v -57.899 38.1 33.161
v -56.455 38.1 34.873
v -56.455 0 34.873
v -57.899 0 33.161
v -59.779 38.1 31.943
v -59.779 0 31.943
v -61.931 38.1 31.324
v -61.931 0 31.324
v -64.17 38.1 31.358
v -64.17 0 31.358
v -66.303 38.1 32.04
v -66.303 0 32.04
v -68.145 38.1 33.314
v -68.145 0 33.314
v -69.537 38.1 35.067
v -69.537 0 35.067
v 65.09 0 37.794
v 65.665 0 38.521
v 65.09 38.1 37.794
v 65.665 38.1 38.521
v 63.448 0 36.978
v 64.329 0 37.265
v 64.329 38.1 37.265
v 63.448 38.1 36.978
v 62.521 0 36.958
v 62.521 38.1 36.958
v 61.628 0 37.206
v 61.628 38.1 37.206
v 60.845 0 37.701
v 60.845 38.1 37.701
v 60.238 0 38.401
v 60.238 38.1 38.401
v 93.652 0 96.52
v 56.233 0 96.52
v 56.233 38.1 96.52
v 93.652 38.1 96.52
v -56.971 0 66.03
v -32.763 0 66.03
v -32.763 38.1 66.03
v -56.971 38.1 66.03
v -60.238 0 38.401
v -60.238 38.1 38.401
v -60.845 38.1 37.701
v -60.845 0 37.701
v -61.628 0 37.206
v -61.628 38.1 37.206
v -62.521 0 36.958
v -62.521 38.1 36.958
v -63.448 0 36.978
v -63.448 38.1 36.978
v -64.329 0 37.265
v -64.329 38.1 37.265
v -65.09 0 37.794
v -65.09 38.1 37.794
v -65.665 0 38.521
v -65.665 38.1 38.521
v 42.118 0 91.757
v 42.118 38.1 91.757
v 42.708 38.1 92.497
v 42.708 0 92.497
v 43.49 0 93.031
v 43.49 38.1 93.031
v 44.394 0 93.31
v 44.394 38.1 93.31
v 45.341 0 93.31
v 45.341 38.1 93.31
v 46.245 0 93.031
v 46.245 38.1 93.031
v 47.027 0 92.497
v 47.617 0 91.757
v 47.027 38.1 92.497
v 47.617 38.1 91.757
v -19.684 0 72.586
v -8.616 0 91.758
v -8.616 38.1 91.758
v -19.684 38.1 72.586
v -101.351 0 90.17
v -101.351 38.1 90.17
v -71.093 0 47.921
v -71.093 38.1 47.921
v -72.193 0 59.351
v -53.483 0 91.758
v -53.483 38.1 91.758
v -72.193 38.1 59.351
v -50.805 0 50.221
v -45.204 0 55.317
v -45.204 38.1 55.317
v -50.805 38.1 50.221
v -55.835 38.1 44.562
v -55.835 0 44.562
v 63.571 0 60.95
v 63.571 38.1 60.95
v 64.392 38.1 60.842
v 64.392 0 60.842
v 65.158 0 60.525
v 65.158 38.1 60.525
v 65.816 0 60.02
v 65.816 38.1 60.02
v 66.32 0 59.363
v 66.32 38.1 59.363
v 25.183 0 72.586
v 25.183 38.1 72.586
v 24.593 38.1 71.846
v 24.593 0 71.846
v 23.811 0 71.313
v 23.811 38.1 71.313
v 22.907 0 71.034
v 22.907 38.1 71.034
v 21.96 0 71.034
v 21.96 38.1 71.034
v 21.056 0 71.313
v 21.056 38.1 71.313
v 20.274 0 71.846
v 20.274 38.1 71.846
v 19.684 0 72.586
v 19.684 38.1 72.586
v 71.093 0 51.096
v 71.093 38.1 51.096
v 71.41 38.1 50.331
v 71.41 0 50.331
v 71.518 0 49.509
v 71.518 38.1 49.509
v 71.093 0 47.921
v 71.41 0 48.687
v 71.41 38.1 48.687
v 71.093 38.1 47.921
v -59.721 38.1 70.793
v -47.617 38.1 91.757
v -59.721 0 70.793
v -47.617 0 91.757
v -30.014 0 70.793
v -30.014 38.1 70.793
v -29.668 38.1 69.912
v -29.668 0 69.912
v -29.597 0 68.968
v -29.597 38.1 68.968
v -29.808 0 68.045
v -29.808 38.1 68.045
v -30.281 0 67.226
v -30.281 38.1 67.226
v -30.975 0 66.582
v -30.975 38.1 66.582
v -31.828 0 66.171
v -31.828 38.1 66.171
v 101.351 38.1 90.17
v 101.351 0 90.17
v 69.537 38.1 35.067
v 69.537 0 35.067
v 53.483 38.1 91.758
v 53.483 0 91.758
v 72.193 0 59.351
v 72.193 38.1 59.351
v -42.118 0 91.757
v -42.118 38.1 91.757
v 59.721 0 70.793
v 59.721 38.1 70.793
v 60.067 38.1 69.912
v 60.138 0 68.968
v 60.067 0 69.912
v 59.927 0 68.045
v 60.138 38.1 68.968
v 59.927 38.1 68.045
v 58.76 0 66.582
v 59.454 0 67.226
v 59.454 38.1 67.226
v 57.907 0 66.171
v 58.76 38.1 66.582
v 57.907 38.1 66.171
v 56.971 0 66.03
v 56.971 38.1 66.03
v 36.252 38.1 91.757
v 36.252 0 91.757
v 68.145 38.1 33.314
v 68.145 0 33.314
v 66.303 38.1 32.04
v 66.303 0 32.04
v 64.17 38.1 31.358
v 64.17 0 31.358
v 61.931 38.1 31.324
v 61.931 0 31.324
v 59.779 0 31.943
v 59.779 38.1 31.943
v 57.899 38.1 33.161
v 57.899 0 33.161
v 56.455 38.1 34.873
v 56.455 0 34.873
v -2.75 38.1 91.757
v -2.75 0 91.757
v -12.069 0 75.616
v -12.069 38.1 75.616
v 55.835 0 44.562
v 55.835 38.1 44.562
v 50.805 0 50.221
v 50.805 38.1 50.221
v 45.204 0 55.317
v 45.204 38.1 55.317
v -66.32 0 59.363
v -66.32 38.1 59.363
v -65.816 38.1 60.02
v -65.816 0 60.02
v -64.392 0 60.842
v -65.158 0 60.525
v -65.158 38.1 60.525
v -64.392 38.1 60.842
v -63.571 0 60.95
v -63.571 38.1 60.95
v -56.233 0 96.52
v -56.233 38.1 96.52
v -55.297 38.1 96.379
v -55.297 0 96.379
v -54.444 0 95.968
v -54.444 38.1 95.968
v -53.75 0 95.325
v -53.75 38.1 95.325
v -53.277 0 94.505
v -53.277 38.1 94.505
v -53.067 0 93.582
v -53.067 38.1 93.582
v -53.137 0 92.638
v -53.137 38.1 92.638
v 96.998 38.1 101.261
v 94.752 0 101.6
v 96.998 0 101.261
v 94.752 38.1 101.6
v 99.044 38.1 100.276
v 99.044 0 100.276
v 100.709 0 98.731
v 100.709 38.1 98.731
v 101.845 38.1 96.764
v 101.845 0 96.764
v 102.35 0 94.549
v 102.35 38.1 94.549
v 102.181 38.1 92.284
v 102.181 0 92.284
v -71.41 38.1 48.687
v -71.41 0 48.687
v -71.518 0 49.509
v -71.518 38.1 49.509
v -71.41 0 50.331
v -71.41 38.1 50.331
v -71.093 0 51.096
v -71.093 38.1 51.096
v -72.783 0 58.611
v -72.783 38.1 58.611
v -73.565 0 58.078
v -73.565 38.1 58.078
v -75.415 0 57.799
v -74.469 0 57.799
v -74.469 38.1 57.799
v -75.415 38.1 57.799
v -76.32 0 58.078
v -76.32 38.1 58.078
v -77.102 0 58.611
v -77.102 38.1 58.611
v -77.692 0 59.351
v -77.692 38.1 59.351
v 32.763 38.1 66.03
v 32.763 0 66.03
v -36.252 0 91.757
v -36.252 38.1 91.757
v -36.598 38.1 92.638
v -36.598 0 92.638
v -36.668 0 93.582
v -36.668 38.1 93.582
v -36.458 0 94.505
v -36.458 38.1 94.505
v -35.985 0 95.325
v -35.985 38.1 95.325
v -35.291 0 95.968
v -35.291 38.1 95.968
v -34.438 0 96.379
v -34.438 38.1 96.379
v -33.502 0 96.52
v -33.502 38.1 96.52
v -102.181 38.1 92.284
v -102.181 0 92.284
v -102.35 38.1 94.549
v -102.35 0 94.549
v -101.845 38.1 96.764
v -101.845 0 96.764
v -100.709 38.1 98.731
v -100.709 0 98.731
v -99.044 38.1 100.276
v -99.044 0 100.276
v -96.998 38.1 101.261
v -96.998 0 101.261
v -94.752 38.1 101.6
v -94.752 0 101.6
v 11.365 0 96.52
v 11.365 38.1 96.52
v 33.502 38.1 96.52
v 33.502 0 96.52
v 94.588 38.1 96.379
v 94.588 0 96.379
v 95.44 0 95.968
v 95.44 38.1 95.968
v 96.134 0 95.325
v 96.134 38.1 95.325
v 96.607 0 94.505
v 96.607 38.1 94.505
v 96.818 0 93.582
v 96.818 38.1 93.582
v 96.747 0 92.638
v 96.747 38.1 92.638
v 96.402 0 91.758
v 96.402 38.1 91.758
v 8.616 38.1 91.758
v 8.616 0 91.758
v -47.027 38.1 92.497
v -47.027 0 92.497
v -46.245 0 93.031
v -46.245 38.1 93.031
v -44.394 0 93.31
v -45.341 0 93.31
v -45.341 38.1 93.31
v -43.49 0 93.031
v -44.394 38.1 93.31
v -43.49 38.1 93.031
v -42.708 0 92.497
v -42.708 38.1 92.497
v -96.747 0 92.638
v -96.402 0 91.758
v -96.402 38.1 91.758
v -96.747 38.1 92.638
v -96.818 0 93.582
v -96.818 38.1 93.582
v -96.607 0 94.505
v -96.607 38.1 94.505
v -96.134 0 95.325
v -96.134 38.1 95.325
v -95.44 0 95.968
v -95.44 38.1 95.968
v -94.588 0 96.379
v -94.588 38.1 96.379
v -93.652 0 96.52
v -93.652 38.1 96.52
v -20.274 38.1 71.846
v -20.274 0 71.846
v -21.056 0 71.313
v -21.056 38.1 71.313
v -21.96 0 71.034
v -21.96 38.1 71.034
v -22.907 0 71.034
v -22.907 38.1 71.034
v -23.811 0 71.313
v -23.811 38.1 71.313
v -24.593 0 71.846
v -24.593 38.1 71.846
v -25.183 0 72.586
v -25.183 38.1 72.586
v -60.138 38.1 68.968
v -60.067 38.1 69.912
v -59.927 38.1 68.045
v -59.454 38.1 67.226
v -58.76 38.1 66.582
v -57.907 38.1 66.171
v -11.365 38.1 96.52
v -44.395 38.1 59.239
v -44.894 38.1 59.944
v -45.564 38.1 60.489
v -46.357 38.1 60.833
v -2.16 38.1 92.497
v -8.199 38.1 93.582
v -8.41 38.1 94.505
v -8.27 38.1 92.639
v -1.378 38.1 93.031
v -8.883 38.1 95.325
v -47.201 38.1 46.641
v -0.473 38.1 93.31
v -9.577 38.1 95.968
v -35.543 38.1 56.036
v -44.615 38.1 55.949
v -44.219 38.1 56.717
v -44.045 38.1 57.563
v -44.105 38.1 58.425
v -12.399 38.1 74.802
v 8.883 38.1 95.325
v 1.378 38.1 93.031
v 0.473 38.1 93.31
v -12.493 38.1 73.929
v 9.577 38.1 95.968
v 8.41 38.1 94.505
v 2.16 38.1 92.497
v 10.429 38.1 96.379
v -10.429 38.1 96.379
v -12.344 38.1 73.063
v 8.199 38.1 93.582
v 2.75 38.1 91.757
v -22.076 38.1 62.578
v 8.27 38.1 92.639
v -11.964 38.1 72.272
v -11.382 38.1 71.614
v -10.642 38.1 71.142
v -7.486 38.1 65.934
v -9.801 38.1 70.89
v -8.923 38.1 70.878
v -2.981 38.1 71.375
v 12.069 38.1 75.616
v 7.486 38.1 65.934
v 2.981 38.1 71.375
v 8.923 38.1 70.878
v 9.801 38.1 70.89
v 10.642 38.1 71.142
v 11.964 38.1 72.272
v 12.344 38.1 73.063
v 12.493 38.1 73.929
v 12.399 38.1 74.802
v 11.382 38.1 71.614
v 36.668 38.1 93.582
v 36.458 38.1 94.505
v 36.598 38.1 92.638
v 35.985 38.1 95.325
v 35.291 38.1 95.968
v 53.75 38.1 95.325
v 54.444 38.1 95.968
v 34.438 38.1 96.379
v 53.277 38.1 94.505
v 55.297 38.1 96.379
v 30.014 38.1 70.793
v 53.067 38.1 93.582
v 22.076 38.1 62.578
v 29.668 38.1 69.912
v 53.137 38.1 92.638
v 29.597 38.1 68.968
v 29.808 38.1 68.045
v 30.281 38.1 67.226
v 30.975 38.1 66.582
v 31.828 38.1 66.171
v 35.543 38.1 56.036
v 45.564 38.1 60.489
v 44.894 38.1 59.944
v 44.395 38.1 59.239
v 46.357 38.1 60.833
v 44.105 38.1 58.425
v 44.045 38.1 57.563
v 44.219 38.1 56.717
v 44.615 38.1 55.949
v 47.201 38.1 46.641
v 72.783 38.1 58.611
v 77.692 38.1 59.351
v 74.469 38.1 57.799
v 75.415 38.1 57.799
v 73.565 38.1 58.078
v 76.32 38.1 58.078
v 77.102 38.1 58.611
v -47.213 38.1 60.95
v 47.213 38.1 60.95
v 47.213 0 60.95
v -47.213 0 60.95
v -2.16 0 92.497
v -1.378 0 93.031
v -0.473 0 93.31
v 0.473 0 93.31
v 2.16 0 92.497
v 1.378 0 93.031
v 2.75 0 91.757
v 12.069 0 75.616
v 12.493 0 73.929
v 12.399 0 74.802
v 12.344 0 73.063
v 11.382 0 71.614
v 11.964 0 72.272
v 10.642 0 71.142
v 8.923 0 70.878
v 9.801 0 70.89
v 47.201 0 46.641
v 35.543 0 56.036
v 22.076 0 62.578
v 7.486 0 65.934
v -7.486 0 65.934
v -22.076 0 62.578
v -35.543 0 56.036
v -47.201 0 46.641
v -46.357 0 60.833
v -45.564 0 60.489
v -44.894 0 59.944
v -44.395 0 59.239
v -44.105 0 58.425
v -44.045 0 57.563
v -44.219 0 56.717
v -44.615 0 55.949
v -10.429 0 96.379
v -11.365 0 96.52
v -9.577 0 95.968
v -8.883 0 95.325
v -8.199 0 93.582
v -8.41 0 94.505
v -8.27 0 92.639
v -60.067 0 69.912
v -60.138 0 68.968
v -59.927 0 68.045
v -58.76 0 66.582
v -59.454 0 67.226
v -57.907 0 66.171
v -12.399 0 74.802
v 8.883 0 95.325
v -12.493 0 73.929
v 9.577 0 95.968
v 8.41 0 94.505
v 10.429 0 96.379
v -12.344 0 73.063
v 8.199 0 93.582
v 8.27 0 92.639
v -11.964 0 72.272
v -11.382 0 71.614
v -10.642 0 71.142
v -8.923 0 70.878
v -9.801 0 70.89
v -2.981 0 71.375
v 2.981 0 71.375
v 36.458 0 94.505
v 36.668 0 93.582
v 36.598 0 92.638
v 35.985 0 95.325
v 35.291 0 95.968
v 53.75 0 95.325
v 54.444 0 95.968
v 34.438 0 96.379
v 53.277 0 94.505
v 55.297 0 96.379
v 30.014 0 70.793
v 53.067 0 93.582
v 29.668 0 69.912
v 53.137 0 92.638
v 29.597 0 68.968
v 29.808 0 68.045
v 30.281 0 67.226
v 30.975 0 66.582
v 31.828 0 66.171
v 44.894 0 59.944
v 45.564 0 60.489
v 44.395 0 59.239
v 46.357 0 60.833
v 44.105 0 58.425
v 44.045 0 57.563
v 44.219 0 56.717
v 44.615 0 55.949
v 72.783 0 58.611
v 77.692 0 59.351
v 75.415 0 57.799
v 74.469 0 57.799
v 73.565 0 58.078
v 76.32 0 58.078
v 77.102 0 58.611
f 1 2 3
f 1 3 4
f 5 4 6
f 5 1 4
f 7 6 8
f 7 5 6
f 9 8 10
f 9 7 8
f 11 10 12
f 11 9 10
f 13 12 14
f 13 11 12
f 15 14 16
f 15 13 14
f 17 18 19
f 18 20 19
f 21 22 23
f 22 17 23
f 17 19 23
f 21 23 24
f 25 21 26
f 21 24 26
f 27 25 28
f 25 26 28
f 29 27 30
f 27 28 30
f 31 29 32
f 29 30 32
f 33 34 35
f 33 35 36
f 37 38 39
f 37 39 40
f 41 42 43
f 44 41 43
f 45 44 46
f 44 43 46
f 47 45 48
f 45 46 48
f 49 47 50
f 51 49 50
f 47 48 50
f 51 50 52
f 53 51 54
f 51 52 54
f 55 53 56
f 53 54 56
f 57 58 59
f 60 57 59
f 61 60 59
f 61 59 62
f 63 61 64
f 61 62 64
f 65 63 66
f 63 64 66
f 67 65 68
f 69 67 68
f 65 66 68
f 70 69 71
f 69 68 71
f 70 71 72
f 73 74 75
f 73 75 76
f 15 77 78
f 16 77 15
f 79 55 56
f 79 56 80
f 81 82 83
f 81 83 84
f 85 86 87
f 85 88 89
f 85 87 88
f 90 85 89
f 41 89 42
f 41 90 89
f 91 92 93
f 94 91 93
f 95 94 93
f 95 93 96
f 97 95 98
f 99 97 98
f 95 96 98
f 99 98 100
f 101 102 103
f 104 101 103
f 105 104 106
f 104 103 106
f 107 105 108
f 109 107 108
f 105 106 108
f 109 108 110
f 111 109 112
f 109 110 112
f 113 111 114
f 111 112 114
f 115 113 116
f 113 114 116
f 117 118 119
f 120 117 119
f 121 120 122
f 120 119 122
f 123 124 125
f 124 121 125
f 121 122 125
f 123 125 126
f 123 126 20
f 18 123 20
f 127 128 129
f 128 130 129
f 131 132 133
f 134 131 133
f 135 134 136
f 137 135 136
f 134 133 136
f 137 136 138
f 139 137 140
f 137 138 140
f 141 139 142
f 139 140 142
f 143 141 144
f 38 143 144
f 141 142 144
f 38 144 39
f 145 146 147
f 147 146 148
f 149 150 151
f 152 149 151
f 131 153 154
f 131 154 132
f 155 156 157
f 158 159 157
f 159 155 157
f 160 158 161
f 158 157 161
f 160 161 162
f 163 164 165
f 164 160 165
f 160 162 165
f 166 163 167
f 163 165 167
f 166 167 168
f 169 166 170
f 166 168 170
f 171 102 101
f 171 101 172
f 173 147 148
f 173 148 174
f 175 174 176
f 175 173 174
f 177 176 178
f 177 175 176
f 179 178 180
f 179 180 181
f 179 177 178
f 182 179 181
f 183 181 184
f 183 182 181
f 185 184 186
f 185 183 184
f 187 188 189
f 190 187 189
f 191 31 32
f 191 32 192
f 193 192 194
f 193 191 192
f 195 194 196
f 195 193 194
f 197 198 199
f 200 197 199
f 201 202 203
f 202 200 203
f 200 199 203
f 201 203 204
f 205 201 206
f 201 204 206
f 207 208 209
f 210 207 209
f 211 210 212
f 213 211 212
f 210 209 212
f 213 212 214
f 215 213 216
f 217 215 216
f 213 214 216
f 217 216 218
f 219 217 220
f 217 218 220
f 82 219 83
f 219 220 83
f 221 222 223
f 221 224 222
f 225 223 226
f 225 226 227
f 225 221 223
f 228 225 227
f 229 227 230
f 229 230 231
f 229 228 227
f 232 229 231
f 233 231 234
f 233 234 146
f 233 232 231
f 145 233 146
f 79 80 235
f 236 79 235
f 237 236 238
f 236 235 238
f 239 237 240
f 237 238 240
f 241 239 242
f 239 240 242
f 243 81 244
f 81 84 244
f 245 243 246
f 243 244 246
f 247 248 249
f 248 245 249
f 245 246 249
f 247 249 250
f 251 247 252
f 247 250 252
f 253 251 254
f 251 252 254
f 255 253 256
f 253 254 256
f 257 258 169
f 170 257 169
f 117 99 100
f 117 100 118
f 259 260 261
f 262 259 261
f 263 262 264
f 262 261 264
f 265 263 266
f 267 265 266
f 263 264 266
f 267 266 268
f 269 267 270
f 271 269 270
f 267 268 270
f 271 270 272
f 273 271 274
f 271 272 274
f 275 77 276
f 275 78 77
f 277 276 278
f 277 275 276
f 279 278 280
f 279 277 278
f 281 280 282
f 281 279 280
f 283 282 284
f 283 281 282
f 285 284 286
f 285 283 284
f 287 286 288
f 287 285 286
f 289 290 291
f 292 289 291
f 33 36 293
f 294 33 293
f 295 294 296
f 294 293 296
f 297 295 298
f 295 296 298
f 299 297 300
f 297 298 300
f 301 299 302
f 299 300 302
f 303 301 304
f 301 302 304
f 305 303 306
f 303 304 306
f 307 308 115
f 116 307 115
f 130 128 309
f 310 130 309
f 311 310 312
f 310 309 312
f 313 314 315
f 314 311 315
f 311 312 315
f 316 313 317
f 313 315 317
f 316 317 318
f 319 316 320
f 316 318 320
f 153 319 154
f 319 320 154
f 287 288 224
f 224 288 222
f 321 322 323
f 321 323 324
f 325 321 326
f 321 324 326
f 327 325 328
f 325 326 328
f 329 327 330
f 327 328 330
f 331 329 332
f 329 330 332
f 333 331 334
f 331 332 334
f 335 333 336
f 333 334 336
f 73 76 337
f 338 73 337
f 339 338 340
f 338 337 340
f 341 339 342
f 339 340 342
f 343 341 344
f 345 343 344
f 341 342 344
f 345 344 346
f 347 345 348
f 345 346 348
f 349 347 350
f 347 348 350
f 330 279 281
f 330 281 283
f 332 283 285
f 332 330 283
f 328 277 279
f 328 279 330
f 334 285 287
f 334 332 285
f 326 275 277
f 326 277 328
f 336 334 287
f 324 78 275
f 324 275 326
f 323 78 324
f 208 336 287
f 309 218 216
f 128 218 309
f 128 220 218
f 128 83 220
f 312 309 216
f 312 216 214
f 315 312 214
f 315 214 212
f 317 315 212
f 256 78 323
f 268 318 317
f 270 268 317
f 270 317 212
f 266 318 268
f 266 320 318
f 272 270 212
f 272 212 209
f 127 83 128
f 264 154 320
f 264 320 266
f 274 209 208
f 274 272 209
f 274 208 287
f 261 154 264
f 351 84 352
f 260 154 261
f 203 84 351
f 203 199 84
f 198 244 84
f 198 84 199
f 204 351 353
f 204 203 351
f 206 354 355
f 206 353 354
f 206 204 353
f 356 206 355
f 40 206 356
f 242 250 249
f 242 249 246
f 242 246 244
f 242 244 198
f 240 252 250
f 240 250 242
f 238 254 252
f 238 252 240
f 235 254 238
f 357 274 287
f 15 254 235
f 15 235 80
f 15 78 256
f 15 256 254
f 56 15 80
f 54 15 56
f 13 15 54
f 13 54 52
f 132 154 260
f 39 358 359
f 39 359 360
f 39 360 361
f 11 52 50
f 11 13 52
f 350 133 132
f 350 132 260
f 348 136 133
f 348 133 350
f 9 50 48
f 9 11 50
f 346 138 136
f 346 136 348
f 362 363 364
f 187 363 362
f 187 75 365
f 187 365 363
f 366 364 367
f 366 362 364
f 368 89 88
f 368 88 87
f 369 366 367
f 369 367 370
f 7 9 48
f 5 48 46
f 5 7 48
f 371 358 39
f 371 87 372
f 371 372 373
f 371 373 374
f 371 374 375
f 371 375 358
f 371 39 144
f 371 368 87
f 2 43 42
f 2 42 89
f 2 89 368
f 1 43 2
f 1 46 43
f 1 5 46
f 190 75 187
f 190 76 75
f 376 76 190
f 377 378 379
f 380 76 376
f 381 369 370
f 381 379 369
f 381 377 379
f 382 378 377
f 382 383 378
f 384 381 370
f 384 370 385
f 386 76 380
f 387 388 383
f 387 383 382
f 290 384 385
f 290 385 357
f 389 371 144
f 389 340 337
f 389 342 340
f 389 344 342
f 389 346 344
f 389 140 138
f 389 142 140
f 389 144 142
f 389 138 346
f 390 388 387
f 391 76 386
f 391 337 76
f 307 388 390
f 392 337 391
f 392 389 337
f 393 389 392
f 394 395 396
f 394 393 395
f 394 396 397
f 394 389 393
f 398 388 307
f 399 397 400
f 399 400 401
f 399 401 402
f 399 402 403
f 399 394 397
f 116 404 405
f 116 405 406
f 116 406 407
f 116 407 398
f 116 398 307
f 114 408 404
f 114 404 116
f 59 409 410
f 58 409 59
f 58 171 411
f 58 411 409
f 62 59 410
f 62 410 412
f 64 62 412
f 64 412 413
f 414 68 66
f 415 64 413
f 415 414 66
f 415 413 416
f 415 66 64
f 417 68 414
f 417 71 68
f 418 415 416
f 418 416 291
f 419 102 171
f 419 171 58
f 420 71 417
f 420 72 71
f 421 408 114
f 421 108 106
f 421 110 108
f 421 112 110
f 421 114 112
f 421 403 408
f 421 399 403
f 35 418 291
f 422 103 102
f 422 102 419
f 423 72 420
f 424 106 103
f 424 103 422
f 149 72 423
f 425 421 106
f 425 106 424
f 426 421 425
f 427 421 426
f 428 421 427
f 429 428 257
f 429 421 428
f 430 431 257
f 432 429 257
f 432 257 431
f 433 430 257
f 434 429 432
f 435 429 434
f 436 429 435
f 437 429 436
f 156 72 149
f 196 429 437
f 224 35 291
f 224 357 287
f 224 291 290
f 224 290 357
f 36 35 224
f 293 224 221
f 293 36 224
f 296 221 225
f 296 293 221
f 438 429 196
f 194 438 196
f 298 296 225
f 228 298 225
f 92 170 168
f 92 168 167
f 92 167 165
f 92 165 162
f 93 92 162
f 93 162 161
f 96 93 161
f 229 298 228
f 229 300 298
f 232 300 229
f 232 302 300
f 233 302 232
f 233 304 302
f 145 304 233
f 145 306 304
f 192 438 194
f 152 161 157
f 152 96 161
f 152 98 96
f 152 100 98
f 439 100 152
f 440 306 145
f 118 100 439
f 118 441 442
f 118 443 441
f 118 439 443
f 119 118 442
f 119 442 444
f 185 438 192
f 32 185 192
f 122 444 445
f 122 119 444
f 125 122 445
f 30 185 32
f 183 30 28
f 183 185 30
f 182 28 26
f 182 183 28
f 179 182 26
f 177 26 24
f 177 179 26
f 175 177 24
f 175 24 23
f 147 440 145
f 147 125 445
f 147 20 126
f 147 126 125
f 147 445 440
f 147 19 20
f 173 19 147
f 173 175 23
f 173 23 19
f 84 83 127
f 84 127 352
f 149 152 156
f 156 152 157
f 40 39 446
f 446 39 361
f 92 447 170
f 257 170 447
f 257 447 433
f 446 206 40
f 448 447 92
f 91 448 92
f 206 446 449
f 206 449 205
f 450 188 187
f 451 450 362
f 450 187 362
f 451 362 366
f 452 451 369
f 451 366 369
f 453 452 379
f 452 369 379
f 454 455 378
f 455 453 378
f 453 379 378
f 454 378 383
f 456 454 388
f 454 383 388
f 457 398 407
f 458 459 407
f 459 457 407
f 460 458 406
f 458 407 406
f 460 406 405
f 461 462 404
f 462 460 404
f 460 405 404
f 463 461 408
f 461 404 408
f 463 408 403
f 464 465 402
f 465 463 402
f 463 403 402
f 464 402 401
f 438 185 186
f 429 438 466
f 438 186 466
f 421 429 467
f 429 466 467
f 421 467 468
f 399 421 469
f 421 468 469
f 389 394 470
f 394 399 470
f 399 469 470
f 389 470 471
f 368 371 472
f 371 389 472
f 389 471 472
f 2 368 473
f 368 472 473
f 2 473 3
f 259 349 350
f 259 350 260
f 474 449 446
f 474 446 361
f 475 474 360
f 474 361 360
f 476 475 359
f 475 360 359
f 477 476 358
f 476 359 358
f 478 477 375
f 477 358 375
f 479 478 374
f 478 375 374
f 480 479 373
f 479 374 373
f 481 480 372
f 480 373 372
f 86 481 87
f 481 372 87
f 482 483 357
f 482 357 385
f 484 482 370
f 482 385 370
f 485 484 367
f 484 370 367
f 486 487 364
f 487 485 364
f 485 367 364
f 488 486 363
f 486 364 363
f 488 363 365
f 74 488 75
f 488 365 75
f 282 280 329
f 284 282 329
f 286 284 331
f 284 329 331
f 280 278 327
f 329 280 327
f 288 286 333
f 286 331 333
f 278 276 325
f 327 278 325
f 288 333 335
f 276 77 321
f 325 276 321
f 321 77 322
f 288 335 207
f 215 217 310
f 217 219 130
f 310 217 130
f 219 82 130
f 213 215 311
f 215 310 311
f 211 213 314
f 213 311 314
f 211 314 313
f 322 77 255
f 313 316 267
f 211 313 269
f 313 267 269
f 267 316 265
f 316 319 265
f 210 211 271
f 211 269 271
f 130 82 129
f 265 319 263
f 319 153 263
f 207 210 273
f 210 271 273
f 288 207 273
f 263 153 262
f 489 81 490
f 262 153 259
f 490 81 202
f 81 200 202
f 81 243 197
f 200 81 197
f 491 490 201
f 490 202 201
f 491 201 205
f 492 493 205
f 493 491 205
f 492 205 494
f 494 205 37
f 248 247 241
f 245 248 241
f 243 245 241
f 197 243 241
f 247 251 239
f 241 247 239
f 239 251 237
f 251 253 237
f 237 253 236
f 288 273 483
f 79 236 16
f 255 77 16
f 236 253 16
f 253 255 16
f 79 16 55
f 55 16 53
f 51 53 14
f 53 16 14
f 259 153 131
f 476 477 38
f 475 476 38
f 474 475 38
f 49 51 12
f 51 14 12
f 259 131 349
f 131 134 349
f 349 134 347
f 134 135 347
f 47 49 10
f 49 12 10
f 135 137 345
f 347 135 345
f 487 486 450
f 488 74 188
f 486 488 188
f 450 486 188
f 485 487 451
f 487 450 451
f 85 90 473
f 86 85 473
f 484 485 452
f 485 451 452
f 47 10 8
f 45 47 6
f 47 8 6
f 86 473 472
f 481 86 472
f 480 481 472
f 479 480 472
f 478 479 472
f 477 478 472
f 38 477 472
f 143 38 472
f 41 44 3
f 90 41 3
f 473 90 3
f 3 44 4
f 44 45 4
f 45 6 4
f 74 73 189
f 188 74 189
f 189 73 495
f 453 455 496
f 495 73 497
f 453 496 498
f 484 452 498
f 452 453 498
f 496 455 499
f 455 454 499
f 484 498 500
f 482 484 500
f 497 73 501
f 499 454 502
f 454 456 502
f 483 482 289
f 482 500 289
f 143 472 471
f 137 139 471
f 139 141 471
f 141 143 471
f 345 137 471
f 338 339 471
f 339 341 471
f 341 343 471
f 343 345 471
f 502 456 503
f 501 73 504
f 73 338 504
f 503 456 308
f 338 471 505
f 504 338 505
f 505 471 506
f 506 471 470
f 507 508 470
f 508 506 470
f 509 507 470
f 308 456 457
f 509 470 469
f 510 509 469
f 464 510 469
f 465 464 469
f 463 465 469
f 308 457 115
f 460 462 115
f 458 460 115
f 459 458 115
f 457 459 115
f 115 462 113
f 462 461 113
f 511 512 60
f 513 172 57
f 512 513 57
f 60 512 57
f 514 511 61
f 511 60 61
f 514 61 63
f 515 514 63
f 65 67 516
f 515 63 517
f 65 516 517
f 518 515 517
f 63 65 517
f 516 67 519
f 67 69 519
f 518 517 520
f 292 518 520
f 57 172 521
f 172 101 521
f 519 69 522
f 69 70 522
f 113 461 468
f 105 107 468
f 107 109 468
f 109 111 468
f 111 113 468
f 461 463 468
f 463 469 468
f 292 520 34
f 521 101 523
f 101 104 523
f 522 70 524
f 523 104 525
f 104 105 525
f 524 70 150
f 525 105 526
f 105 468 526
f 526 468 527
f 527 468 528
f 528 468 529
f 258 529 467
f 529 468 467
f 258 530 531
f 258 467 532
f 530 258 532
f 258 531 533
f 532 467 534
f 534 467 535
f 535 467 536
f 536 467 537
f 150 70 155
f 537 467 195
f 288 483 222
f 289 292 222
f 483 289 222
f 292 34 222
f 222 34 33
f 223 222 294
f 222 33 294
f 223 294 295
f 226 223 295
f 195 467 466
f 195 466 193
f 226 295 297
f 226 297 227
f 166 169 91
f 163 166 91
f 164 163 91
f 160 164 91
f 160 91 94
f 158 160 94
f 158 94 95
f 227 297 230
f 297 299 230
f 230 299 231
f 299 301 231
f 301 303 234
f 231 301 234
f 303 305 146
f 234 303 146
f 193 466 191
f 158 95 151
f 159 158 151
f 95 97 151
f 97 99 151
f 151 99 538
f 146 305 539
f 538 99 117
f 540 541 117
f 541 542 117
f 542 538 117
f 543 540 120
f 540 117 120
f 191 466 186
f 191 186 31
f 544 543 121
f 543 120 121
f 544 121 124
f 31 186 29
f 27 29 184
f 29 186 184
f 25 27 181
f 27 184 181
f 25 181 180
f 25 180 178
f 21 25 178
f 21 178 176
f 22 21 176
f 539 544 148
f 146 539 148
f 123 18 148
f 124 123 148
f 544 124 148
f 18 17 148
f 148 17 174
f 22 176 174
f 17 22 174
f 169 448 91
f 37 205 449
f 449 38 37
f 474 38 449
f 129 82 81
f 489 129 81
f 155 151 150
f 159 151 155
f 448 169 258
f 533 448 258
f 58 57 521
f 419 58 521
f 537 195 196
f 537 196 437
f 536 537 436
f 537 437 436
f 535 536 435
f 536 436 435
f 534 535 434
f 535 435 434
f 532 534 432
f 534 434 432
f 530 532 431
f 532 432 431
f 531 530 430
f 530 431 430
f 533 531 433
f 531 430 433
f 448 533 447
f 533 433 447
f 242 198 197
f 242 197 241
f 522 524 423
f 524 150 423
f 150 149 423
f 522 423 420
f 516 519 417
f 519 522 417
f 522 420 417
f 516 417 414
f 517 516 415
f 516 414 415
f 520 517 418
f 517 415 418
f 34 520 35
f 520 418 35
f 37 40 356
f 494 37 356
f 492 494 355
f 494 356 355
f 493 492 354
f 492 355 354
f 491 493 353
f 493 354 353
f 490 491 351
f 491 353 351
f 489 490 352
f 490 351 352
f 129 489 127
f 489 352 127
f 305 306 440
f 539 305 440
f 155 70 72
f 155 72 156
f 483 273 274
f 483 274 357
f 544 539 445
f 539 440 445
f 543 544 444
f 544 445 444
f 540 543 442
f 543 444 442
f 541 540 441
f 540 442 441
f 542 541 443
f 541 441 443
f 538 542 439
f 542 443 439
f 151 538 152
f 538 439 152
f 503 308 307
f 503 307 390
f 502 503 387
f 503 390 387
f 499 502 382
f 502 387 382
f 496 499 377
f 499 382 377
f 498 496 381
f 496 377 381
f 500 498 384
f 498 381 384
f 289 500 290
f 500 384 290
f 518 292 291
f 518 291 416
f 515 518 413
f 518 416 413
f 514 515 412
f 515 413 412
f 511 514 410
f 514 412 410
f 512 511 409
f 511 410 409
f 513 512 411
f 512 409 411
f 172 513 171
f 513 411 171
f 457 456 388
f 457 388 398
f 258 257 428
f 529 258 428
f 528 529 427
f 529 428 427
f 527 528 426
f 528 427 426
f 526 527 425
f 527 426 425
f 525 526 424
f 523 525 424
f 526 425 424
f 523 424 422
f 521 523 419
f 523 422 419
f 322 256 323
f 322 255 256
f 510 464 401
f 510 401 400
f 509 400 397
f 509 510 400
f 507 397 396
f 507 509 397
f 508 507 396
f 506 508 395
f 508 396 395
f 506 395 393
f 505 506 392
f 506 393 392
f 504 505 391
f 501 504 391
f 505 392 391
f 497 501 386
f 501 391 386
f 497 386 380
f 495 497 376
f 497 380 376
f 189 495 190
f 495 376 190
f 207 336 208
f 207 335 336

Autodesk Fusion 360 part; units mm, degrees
sketch "Sketch1" plane through (0, 0, 0) normal (0, 1, 0) x (1, 0, 0)
  circle A0 centre (0, 0) radius 68.2625 construction
  line L0 (0, 0) -> (0, -72.136) construction
  circle A1 centre (0, -72.136) radius 22.098 construction
  circle A2 centre (0, 0) radius 65.7225 construction
  circle A3 centre (0, 0) radius 66.3575
  line L1 (0, -72.136) -> (0, -101.6) construction
  line L2 (-107.95, -101.6) -> (107.95, -101.6)
  line L3 (-107.95, -101.6) -> (-62.3707, -22.6543)
  line L4 (107.95, -101.6) -> (62.3707, -22.6543)
  circle A4 centre (0, 0) radius 71.4375
  line L5 (-62.9376, -33.7962) -> (-99.1512, -96.52)
  line L6 (-99.1512, -96.52) -> (99.1512, -96.52)
  line L7 (99.1512, -96.52) -> (59.9049, -28.5434)
  line L8 (0, -96.52) -> (15.4586, -69.7449)
  line L9 (5.8659, -96.52) -> (22.4337, -67.8236)
  line L10 (22.4337, -67.8236) -> (39.0016, -96.52)
  line L11 (44.8675, -96.52) -> (27.2642, -66.0302)
  line L12 (44.8675, -96.52) -> (72.0093, -49.5089)
  line L13 (50.7334, -96.52) -> (74.9423, -54.5889)
  line L14 (27.2642, -66.0302) -> (62.4708, -66.0302)
  line L15 (37.2612, -60.9502) -> (65.4037, -60.9502)
  line L16 (0, -96.52) -> (-15.4586, -69.7449)
  line L17 (-22.4337, -67.8236) -> (-39.0016, -96.52)
  line L18 (-5.8659, -96.52) -> (-22.4337, -67.8236)
  line L19 (-44.8675, -96.52) -> (-27.2642, -66.0302)
  line L20 (-27.2642, -66.0302) -> (-62.4708, -66.0302)
  line L21 (-44.8675, -96.52) -> (-72.0093, -49.5089)
  line L22 (-50.7334, -96.52) -> (-74.9423, -54.5889)
  line L23 (-37.2612, -60.9502) -> (-65.4037, -60.9502)
  dimension "d1" = 136.525
  dimension "d2" = 72.136
  dimension "d3" = 44.196
  dimension "d7" = 131.445
  dimension "d8" = 0.635
  dimension "d9" = 101.6
  dimension "d10" = 60
  dimension "d11" = 215.9
  dimension "d14" = 5.08
  dimension "d15" = 5.08
  dimension "d16" = 5.08
  dimension "d17" = 5.08
  dimension "d30" = 30
  dimension "d31" = 5.08
  dimension "d32" = 60
  dimension "d34" = 60
  dimension "d35" = 5.08
  dimension "d36" = 5.08
  dimension "d37" = 5.08
extrude "Extrude1" add sketch "Sketch1" along normal blind 38.1 contours A3 L3 A4 L7 | A3 L4 A4 L7 | L2 L3 L4 A4 L5 L6 L7 | A4 L12 L14 L15 | L6 L7 L12 L13 | A4 L20 L21 L23 | L5 L6 L21 L22 | A4 L6 L10 L11 | A4 L6 L17 L19 | A4 L6 L8 L9 | A4 L6 L16 L18
fillet "Fillet2" radius 3.175 29 edges at (-62.9376, 19.05, 33.7962) (-99.1512, 19.05, 96.52) (99.1512, 19.05, 96.52) (62.9376, 19.05, 33.7962) (-72.0093, 19.05, 49.5089) (-65.4037, 19.05, 60.9502) (-37.2612, 19.05, 60.9502) (-74.9423, 19.05, 54.5889) (-50.7334, 19.05, 96.52) (-62.4708, 19.05, 66.0302) (-44.8675, 19.05, 96.52) (-27.2642, 19.05, 66.0302) (-39.0016, 19.05, 96.52) (-22.4337, 19.05, 67.8236) (-5.8659, 19.05, 96.52) (-15.4586, 19.05, 69.7449) (15.4586, 19.05, 69.7449) (0, 19.05, 96.52) (5.8659, 19.05, 96.52) (22.4337, 19.05, 67.8236) (39.0016, 19.05, 96.52) (27.2642, 19.05, 66.0302) (44.8675, 19.05, 96.52) (62.4708, 19.05, 66.0302) (37.2612, 19.05, 60.9502) (72.0093, 19.05, 49.5089) (65.4037, 19.05, 60.9502) (74.9423, 19.05, 54.5889) (50.7334, 19.05, 96.52)
fillet "Fillet1" radius 7.62 4 edges at (-62.3707, 19.05, 22.6543) (62.3707, 19.05, 22.6543) (107.95, 19.05, 101.6) (-107.95, 19.05, 101.6)
equation "d15 = d14"
equation "d16 = d14"
equation "d17 = d14"
equation "d31 = d14"
equation "d35 = d14"
equation "d36 = d35"
equation "d37 = d17"
